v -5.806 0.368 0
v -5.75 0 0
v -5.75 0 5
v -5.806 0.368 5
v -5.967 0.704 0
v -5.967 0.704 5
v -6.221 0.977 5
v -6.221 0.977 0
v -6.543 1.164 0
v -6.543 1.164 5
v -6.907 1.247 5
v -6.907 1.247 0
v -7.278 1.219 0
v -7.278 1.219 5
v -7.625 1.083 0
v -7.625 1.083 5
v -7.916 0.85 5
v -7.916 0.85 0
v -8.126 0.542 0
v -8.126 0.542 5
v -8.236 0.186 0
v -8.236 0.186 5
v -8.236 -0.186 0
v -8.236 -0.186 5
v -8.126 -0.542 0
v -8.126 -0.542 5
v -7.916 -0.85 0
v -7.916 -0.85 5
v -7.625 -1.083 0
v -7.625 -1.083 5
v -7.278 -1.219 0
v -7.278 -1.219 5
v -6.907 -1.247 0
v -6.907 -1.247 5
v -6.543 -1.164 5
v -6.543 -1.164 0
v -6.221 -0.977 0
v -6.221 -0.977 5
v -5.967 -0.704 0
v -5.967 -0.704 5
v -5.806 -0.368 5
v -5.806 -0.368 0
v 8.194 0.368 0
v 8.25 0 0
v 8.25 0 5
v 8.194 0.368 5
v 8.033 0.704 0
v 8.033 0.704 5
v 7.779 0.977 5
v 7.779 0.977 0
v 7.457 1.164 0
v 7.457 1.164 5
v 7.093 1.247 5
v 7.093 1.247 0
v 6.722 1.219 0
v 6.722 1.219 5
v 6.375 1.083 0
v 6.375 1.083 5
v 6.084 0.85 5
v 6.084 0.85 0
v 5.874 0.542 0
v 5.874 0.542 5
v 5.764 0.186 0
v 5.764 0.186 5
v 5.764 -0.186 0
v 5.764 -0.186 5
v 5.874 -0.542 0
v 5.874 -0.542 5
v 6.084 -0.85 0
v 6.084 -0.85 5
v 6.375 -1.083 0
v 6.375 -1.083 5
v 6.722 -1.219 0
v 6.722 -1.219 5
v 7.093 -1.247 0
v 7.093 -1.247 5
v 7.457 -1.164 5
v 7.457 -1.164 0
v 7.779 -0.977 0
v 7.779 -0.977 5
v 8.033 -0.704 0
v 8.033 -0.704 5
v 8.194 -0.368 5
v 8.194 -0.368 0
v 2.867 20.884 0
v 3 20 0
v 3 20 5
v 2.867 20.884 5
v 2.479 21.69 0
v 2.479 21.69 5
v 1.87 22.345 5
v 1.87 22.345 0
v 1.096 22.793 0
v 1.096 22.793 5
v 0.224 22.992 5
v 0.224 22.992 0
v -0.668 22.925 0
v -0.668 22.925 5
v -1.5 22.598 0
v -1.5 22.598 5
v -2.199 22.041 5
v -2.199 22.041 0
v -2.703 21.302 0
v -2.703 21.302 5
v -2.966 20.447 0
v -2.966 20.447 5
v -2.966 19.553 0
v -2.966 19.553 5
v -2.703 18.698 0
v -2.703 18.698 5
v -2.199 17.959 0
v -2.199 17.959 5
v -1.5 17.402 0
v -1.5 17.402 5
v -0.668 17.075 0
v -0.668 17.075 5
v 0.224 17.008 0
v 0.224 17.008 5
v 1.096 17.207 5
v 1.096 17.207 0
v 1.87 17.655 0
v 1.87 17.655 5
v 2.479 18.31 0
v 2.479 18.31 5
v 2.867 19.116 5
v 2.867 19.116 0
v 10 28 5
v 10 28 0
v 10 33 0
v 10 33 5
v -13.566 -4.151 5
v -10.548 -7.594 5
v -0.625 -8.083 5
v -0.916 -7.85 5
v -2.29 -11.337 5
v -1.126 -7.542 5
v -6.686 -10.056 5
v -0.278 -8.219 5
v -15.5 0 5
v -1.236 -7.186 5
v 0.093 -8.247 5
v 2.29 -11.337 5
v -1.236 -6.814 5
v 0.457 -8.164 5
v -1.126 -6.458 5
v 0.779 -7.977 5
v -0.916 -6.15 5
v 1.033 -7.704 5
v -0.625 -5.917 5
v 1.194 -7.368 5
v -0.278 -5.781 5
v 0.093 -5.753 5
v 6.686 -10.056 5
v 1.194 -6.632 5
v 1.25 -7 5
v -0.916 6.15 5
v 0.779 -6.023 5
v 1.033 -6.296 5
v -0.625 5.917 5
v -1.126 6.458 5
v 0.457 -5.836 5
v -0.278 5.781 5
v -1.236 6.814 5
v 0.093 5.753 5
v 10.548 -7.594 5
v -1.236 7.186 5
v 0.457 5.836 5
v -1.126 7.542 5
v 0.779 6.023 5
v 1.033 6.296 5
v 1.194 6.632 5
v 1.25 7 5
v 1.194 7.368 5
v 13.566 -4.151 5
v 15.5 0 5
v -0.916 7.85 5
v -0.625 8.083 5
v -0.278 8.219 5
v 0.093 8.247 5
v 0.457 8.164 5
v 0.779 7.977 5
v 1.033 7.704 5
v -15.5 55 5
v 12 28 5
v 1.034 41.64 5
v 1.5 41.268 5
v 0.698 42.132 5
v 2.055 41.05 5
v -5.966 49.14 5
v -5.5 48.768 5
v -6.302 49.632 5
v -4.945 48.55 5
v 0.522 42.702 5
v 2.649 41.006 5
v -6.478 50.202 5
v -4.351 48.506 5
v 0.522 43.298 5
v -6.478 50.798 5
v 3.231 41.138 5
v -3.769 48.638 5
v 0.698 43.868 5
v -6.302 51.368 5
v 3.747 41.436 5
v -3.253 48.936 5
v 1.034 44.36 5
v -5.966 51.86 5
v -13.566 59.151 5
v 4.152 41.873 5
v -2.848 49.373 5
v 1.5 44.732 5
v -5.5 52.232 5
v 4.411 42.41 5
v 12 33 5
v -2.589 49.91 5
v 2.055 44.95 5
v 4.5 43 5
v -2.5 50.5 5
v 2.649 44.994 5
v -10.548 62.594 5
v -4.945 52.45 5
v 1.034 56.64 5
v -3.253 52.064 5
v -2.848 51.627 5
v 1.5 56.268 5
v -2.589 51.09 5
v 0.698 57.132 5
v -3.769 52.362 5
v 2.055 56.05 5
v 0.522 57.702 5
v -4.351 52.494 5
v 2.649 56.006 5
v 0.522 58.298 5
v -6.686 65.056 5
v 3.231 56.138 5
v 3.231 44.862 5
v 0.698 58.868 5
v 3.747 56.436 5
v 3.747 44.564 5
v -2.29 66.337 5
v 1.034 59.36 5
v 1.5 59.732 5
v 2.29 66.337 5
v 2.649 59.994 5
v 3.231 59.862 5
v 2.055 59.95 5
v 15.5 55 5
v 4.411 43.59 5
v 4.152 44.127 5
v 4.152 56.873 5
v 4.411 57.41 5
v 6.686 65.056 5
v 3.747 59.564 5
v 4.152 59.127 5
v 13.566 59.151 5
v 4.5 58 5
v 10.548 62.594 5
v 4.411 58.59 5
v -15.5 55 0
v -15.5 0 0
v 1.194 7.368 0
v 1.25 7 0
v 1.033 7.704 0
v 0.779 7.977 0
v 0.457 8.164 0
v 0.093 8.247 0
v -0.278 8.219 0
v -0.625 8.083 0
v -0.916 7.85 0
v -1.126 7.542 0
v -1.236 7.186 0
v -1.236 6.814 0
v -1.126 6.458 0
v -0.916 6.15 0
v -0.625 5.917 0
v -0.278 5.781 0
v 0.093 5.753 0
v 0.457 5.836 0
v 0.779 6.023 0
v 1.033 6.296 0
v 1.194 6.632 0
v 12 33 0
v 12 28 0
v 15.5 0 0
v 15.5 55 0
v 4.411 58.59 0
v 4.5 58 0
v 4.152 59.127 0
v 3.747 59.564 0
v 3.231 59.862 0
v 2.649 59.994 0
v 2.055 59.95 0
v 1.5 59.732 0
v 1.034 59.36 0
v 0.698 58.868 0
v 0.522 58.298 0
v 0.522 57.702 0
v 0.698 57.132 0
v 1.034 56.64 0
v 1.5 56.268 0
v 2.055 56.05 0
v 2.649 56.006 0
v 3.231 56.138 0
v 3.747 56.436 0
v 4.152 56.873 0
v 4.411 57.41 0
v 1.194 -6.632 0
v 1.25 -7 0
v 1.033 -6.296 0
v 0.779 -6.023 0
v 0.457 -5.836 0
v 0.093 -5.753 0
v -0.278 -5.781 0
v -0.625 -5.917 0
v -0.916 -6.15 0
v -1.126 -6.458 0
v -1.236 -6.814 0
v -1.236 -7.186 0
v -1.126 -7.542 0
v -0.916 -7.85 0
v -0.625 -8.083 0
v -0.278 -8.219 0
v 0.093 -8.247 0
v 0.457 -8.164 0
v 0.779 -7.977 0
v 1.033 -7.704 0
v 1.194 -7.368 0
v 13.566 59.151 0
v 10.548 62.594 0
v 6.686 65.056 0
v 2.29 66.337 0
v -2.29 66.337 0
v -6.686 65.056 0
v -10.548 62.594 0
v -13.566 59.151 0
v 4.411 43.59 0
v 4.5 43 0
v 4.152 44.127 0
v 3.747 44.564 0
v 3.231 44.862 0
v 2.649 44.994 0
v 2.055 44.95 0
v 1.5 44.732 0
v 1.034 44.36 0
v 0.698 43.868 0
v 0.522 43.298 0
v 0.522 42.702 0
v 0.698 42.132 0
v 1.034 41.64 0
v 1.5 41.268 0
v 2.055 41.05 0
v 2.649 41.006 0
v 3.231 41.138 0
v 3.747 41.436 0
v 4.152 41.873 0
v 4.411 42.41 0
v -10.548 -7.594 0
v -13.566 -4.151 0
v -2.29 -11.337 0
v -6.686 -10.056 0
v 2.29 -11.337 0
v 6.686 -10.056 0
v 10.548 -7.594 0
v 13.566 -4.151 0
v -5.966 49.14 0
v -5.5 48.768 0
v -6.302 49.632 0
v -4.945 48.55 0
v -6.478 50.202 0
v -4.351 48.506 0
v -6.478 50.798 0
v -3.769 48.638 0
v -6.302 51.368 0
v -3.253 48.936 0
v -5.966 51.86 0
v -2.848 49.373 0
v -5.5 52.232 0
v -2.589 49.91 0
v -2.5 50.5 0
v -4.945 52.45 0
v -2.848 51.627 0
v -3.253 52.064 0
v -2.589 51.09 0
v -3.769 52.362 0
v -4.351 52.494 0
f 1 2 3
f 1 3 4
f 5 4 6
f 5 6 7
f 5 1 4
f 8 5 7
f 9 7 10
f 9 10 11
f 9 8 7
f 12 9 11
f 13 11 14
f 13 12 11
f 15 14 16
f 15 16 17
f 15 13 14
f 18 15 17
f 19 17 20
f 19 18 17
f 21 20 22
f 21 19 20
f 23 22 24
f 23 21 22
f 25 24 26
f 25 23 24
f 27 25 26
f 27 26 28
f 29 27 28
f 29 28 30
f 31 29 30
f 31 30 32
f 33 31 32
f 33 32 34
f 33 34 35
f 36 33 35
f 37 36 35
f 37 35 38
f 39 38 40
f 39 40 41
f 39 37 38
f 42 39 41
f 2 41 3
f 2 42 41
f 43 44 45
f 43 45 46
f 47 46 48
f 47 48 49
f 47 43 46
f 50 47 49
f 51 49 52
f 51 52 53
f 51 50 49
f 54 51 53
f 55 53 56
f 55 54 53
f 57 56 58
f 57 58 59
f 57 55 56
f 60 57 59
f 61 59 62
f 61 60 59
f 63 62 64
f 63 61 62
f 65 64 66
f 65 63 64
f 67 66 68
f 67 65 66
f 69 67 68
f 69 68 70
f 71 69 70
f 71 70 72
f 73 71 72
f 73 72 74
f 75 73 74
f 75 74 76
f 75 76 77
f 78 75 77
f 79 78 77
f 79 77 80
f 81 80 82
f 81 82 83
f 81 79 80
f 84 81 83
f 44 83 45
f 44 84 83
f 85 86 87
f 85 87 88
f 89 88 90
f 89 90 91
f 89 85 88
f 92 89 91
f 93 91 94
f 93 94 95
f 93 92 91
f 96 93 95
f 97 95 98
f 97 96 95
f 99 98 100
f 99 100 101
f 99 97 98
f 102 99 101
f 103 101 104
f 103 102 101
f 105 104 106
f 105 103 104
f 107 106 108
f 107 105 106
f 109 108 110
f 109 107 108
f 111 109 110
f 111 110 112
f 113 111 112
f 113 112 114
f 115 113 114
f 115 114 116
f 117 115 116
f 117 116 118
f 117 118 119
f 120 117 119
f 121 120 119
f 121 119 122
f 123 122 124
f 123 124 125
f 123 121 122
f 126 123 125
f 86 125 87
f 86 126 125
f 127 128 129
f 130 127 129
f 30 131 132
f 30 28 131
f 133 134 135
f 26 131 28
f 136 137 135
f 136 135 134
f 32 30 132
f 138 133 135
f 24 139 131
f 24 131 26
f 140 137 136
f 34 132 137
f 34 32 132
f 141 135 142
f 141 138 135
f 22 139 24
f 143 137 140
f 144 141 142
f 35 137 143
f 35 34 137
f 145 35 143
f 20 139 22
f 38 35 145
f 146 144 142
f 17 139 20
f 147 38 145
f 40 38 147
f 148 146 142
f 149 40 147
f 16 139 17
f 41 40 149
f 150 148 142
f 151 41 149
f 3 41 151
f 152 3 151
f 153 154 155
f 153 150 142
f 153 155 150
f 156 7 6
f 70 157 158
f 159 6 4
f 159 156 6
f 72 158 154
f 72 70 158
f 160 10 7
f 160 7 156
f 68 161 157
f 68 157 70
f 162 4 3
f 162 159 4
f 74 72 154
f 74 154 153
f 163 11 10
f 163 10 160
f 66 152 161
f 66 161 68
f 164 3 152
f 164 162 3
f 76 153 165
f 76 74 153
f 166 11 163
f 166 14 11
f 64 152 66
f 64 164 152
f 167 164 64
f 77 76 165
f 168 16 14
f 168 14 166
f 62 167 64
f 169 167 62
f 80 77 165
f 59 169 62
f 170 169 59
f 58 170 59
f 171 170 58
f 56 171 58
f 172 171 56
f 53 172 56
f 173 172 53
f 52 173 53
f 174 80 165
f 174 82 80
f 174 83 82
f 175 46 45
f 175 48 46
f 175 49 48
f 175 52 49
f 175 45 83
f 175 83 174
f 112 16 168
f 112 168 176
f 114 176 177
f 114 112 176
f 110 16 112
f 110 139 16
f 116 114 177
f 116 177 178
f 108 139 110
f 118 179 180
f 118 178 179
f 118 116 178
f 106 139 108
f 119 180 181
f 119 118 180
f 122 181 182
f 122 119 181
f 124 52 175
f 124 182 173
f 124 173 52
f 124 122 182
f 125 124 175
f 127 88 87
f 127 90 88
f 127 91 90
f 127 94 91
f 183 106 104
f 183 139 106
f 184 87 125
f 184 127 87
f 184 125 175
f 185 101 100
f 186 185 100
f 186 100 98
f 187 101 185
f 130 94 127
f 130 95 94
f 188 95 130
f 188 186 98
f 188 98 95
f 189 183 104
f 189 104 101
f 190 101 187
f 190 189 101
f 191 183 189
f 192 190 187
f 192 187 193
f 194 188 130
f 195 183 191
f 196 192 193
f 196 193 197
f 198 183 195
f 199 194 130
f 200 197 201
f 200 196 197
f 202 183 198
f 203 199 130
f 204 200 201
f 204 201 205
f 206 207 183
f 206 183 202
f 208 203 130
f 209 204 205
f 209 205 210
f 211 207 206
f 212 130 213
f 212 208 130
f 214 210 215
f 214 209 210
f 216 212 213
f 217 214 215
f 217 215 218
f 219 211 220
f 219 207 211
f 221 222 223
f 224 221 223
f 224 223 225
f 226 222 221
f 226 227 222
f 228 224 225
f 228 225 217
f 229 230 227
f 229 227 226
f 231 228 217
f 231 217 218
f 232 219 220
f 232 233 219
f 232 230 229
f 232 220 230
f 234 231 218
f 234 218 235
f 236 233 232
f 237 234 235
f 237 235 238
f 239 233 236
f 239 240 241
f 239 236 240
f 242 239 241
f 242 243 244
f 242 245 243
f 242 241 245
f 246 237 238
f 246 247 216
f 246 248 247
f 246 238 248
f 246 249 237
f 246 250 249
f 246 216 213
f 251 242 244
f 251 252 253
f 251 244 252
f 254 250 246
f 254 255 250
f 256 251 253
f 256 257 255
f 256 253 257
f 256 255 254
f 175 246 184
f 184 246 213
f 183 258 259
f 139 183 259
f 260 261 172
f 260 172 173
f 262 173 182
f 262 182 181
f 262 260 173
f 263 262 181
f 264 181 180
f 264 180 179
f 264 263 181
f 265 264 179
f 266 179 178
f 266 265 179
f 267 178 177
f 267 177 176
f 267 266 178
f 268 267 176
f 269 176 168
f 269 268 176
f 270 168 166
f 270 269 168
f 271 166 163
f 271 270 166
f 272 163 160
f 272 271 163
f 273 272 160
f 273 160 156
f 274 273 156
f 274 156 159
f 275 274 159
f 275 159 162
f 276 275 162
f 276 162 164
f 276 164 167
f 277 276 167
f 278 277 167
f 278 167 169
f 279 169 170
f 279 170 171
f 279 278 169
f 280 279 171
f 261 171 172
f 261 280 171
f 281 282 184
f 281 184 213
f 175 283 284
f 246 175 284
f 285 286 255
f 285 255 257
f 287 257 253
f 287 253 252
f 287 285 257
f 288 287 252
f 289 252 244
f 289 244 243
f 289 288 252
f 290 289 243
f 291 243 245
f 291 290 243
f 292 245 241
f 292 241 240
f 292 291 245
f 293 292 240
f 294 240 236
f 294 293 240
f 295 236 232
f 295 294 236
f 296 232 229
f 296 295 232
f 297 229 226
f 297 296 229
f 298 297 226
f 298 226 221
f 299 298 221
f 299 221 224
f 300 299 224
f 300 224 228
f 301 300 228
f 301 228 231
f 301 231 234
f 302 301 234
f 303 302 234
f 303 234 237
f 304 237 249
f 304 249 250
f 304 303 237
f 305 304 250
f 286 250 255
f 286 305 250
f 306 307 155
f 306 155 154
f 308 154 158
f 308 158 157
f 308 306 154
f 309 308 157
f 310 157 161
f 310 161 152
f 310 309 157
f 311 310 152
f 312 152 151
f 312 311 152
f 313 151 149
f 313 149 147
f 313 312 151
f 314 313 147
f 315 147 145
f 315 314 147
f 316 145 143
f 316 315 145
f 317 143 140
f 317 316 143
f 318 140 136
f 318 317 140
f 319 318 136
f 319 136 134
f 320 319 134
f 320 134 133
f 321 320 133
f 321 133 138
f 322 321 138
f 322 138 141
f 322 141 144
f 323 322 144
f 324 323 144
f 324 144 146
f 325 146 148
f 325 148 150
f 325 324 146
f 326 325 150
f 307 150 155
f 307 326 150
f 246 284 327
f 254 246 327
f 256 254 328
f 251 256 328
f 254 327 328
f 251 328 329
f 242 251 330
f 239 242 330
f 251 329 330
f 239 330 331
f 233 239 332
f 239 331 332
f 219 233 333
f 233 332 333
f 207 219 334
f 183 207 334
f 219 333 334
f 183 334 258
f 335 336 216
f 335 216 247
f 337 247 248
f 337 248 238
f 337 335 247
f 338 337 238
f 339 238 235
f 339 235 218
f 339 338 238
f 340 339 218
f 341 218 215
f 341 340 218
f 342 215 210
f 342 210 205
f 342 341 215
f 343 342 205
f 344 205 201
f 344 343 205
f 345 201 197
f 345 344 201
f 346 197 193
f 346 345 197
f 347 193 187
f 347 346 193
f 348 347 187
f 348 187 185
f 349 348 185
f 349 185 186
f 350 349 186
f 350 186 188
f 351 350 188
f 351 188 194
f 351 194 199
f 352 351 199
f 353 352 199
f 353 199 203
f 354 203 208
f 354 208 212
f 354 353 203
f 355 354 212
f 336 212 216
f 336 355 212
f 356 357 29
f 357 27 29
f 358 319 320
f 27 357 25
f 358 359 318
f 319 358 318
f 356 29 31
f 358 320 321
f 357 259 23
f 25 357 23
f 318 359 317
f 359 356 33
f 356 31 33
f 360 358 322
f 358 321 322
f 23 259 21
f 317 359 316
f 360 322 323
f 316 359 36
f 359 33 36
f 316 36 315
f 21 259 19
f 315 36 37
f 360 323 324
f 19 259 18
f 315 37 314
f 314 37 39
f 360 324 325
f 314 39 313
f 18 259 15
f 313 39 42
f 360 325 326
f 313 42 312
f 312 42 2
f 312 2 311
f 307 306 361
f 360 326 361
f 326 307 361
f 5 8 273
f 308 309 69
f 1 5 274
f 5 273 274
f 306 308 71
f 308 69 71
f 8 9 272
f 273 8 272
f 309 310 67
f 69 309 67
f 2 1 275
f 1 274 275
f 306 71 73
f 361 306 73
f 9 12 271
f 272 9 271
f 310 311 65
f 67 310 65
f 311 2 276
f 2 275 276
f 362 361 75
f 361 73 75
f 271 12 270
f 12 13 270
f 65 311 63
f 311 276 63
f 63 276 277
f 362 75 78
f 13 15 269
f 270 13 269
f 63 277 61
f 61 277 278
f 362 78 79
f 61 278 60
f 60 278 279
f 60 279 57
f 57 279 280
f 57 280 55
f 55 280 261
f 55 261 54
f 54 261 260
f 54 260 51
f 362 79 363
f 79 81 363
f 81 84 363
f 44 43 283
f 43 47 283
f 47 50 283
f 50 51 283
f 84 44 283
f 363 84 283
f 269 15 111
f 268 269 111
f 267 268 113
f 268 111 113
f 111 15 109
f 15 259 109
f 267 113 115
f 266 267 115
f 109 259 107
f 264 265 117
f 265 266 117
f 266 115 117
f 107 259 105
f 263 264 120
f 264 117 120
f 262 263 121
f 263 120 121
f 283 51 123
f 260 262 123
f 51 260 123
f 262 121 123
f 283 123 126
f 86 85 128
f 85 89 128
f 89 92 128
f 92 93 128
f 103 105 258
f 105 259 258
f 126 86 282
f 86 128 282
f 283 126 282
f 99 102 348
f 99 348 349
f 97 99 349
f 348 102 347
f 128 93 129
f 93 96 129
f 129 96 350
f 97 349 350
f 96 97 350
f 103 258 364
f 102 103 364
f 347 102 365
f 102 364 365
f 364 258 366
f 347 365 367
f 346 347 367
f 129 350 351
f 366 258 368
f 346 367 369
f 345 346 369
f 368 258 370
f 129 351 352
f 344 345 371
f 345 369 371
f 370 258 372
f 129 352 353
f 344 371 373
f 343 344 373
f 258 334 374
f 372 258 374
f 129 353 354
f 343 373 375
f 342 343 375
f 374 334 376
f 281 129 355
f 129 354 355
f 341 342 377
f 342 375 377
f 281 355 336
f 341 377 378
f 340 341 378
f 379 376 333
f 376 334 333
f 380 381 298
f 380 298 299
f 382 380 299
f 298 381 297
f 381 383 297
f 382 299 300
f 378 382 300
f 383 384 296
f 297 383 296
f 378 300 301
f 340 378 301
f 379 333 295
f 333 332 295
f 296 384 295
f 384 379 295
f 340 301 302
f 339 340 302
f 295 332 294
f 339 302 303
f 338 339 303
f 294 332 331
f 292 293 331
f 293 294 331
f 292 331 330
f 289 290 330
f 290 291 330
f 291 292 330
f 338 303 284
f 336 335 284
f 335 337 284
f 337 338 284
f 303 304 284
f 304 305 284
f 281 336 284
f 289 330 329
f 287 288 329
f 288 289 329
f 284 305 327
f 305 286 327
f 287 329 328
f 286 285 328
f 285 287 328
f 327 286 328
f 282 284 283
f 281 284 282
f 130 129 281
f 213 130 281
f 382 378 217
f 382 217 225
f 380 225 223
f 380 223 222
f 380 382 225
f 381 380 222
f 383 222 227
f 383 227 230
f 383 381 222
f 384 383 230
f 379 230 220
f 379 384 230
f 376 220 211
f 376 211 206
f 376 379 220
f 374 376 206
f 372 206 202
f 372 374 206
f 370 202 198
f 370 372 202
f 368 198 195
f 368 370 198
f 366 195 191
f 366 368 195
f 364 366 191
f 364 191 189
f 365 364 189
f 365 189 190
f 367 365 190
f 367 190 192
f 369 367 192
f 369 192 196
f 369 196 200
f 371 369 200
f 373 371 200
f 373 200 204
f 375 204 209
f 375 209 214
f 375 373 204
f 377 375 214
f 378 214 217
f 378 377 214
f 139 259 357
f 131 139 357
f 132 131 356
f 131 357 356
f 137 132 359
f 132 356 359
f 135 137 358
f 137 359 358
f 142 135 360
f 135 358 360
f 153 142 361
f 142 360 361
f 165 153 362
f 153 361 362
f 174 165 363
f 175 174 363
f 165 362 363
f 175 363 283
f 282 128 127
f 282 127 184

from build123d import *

# Parameters (mm, degrees)
SKETCH1_R           = 1.25
SKETCH1_R_2         = 3
SKETCH1_R_3         = 2
SKETCH1_W           = 2
SKETCH1_H           = 5
BOSS_EXTRUDE1_DEPTH = 5


with BuildPart() as part:
    # Sketch1 → Boss-Extrude1 (new body)
    with BuildSketch(Plane.XY):
        with BuildLine():
            Line((-15.5, 55), (-15.5, 0))
            ThreePointArc((-15.5, 0), (0, -11.5), (15.5, 0))
            Line((15.5, 0), (15.5, 55))
            ThreePointArc((15.5, 55), (0, 66.5), (-15.5, 55))
        make_face()
        with Locations((0, 7)):
            Circle(SKETCH1_R, mode=Mode.SUBTRACT)
        with Locations((7, 0)):
            Circle(SKETCH1_R, mode=Mode.SUBTRACT)
        with Locations((0, -7)):
            Circle(SKETCH1_R, mode=Mode.SUBTRACT)
        with Locations((-7, 0)):
            Circle(SKETCH1_R, mode=Mode.SUBTRACT)
        with Locations((0, 20)):
            Circle(SKETCH1_R_2, mode=Mode.SUBTRACT)
        with Locations((2.5, 58)):
            Circle(SKETCH1_R_3, mode=Mode.SUBTRACT)
        with Locations((2.5, 43)):
            Circle(SKETCH1_R_3, mode=Mode.SUBTRACT)
        with Locations((-4.5, 50.5)):
            Circle(SKETCH1_R_3, mode=Mode.SUBTRACT)
        with Locations((11, 30.5)):
            Rectangle(SKETCH1_W, SKETCH1_H, mode=Mode.SUBTRACT)
    extrude(amount=BOSS_EXTRUDE1_DEPTH)


solid = part.part
